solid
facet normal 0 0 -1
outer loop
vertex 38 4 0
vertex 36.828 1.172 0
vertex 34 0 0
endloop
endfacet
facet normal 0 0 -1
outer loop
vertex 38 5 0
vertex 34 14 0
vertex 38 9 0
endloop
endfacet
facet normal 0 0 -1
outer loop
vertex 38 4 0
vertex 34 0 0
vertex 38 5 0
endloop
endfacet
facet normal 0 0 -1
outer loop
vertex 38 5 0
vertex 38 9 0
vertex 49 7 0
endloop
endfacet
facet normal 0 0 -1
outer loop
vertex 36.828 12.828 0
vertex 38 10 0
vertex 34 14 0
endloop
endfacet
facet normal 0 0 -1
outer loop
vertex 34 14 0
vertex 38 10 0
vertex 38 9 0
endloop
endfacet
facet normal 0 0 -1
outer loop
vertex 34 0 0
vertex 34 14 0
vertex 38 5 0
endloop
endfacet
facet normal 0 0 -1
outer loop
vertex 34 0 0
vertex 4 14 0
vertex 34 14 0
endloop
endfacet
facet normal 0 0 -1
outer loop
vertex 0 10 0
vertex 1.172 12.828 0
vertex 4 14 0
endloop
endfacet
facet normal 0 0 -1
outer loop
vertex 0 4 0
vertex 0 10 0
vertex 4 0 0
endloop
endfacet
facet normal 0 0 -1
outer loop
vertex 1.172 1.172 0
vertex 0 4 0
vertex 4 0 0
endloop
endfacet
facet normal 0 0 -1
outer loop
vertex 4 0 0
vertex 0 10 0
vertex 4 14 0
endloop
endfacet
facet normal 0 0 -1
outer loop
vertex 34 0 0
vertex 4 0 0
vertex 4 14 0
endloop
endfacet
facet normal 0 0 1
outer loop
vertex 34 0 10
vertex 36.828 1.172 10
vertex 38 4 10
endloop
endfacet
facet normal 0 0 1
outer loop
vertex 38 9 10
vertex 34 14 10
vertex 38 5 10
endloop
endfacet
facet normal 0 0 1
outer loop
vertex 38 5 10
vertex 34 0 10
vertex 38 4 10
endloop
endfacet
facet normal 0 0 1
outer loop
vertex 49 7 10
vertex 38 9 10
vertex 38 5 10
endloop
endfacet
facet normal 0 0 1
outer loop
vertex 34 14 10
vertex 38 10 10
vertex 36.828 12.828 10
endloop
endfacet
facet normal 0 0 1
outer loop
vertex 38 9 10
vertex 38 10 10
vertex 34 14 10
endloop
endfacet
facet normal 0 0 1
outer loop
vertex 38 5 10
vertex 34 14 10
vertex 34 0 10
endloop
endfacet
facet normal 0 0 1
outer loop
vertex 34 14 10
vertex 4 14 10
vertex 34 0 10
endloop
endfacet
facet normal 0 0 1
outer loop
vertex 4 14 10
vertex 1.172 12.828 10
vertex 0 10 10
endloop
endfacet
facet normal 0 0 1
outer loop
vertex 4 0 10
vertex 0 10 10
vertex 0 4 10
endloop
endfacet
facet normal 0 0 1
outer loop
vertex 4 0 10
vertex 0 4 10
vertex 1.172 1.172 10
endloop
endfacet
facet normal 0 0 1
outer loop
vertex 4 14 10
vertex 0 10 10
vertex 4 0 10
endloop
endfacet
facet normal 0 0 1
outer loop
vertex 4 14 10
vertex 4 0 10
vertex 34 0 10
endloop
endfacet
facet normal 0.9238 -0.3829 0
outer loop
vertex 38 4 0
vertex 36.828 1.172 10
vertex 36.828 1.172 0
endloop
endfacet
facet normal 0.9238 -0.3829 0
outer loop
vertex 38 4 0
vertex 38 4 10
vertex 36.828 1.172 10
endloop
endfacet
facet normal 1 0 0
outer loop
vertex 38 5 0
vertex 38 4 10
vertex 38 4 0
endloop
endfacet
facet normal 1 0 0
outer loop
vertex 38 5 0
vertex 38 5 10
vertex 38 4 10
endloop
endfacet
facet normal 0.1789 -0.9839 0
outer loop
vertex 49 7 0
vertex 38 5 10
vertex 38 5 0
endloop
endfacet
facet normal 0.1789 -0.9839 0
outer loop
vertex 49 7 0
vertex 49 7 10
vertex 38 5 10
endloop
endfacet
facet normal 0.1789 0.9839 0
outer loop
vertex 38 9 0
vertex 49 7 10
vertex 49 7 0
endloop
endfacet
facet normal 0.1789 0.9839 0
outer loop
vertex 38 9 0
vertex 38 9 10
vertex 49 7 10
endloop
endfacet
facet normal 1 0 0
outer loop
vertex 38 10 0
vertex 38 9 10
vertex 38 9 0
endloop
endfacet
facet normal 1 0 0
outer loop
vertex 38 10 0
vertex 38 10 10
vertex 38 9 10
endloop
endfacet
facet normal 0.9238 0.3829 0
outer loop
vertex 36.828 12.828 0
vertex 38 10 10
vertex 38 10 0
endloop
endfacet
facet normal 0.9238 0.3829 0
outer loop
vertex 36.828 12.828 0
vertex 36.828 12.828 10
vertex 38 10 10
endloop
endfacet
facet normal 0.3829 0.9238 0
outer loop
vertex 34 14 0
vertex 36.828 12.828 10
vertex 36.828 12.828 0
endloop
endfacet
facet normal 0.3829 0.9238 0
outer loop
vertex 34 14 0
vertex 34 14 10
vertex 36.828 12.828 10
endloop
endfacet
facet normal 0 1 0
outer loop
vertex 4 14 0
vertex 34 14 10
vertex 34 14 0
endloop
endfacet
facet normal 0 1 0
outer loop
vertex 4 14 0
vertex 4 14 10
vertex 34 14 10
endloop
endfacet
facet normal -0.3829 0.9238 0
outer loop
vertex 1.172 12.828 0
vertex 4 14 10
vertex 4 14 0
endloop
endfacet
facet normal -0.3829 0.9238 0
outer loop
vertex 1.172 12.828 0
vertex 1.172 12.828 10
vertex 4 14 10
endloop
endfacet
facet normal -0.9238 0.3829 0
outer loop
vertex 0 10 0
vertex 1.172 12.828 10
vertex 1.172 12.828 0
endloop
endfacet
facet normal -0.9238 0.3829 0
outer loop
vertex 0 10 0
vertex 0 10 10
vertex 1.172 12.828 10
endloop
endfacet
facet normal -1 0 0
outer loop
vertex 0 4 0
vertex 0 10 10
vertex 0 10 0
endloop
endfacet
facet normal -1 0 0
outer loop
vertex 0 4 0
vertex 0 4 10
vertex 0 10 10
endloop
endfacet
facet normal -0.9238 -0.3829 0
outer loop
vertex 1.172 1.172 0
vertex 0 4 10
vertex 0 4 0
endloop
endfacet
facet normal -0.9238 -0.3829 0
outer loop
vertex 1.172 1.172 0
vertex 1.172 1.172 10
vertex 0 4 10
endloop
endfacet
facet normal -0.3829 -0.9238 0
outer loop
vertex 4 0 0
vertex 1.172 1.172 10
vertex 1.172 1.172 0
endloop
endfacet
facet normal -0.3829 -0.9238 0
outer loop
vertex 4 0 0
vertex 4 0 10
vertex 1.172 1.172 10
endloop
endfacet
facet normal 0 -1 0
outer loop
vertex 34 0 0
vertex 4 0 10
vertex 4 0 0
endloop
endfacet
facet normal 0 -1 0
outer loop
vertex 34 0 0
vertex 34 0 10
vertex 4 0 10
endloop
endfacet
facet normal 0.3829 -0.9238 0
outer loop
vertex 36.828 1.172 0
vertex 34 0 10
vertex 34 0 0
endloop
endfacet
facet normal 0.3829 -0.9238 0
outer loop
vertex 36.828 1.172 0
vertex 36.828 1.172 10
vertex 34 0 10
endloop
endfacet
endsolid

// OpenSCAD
$fn = 32;

// ----------------------------------------------------------------------
// Ratchet pawl: 38 x 14 mm body, beak 11 mm с правого торца
// ----------------------------------------------------------------------

// --- parameters (mm) ---
profile_height = 10;      // extrusion height
profile_points = 15;      // points of the closed outline

profile = [[0, 4], [1.172, 1.172], [4, 0], [34, 0], [36.828, 1.172], [38, 4], [38, 5], [49, 7], [38, 9], [38, 10], [36.828, 12.828], [34, 14], [4, 14], [1.172, 12.828], [0, 10]];  // single closed polygon, 15 points, counter clockwise

// --- the one profile operation ---
linear_extrude(height = profile_height) polygon(points = profile);
